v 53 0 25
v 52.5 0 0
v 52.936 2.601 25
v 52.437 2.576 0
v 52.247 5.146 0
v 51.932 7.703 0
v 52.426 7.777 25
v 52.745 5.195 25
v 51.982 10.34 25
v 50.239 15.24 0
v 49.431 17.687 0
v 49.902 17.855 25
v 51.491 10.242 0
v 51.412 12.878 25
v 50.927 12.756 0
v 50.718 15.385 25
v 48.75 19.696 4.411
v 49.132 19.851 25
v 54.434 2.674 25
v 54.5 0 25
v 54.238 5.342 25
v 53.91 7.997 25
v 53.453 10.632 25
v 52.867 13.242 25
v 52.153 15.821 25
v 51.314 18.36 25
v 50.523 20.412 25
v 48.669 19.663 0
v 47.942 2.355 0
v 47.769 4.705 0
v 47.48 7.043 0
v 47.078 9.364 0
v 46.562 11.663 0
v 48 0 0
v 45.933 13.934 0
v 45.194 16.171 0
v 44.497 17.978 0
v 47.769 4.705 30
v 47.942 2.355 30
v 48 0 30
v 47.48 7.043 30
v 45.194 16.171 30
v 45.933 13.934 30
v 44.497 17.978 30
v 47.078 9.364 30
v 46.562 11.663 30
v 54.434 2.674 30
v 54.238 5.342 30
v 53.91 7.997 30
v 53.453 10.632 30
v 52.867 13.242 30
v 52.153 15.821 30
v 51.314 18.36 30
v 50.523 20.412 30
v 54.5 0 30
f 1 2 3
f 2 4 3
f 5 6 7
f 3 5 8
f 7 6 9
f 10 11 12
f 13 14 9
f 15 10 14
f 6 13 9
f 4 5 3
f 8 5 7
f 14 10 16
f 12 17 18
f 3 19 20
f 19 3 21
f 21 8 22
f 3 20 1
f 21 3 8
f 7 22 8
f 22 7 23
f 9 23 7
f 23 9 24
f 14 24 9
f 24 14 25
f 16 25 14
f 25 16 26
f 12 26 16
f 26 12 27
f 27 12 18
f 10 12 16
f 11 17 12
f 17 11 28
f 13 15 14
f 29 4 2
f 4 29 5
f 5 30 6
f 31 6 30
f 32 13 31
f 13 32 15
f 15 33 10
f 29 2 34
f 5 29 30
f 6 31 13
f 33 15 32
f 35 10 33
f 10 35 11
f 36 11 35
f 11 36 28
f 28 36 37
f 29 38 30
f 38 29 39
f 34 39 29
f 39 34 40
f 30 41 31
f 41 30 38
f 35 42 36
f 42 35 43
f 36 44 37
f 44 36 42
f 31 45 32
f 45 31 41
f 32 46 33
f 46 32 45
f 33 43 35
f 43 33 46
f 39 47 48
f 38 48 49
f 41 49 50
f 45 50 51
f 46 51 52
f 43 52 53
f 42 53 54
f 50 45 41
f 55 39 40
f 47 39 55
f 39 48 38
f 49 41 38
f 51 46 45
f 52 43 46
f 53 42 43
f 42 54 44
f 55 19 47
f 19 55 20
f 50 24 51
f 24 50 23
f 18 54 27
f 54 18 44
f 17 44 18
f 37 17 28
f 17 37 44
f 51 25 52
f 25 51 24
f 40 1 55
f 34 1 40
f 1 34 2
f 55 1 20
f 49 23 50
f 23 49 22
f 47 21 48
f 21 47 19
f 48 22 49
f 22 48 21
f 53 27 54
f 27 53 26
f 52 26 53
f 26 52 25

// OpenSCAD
d1=96;
d2=d1+2*4.5;
add=1;
d3=d2+2*2;
h=25;
h2=5;
$fn=128;
$e=0.01;

use <MCAD/2Dshapes.scad>;

w=11;

intersection() {
    union() {
        // shell
        difference() {
        cylinder(d1=d2,d2=d2+add,h=h);
            translate([0,0,-$e])
        cylinder(d1=d1,d2=d1,h=h+2*$e);
        }
        // grabber
        translate([0,0,h])
        difference() {
            cylinder(d=d3,h=h2);
                translate([0,0,-$e])
            cylinder(d=d1,h=h2+2*$e);
        }
    }

    // only angle part
    translate([0,0,-$e])
    linear_extrude(2*h+2*$e)
    pieSlice(size=d2/2+2, start_angle=0, end_angle=2*w);
}
